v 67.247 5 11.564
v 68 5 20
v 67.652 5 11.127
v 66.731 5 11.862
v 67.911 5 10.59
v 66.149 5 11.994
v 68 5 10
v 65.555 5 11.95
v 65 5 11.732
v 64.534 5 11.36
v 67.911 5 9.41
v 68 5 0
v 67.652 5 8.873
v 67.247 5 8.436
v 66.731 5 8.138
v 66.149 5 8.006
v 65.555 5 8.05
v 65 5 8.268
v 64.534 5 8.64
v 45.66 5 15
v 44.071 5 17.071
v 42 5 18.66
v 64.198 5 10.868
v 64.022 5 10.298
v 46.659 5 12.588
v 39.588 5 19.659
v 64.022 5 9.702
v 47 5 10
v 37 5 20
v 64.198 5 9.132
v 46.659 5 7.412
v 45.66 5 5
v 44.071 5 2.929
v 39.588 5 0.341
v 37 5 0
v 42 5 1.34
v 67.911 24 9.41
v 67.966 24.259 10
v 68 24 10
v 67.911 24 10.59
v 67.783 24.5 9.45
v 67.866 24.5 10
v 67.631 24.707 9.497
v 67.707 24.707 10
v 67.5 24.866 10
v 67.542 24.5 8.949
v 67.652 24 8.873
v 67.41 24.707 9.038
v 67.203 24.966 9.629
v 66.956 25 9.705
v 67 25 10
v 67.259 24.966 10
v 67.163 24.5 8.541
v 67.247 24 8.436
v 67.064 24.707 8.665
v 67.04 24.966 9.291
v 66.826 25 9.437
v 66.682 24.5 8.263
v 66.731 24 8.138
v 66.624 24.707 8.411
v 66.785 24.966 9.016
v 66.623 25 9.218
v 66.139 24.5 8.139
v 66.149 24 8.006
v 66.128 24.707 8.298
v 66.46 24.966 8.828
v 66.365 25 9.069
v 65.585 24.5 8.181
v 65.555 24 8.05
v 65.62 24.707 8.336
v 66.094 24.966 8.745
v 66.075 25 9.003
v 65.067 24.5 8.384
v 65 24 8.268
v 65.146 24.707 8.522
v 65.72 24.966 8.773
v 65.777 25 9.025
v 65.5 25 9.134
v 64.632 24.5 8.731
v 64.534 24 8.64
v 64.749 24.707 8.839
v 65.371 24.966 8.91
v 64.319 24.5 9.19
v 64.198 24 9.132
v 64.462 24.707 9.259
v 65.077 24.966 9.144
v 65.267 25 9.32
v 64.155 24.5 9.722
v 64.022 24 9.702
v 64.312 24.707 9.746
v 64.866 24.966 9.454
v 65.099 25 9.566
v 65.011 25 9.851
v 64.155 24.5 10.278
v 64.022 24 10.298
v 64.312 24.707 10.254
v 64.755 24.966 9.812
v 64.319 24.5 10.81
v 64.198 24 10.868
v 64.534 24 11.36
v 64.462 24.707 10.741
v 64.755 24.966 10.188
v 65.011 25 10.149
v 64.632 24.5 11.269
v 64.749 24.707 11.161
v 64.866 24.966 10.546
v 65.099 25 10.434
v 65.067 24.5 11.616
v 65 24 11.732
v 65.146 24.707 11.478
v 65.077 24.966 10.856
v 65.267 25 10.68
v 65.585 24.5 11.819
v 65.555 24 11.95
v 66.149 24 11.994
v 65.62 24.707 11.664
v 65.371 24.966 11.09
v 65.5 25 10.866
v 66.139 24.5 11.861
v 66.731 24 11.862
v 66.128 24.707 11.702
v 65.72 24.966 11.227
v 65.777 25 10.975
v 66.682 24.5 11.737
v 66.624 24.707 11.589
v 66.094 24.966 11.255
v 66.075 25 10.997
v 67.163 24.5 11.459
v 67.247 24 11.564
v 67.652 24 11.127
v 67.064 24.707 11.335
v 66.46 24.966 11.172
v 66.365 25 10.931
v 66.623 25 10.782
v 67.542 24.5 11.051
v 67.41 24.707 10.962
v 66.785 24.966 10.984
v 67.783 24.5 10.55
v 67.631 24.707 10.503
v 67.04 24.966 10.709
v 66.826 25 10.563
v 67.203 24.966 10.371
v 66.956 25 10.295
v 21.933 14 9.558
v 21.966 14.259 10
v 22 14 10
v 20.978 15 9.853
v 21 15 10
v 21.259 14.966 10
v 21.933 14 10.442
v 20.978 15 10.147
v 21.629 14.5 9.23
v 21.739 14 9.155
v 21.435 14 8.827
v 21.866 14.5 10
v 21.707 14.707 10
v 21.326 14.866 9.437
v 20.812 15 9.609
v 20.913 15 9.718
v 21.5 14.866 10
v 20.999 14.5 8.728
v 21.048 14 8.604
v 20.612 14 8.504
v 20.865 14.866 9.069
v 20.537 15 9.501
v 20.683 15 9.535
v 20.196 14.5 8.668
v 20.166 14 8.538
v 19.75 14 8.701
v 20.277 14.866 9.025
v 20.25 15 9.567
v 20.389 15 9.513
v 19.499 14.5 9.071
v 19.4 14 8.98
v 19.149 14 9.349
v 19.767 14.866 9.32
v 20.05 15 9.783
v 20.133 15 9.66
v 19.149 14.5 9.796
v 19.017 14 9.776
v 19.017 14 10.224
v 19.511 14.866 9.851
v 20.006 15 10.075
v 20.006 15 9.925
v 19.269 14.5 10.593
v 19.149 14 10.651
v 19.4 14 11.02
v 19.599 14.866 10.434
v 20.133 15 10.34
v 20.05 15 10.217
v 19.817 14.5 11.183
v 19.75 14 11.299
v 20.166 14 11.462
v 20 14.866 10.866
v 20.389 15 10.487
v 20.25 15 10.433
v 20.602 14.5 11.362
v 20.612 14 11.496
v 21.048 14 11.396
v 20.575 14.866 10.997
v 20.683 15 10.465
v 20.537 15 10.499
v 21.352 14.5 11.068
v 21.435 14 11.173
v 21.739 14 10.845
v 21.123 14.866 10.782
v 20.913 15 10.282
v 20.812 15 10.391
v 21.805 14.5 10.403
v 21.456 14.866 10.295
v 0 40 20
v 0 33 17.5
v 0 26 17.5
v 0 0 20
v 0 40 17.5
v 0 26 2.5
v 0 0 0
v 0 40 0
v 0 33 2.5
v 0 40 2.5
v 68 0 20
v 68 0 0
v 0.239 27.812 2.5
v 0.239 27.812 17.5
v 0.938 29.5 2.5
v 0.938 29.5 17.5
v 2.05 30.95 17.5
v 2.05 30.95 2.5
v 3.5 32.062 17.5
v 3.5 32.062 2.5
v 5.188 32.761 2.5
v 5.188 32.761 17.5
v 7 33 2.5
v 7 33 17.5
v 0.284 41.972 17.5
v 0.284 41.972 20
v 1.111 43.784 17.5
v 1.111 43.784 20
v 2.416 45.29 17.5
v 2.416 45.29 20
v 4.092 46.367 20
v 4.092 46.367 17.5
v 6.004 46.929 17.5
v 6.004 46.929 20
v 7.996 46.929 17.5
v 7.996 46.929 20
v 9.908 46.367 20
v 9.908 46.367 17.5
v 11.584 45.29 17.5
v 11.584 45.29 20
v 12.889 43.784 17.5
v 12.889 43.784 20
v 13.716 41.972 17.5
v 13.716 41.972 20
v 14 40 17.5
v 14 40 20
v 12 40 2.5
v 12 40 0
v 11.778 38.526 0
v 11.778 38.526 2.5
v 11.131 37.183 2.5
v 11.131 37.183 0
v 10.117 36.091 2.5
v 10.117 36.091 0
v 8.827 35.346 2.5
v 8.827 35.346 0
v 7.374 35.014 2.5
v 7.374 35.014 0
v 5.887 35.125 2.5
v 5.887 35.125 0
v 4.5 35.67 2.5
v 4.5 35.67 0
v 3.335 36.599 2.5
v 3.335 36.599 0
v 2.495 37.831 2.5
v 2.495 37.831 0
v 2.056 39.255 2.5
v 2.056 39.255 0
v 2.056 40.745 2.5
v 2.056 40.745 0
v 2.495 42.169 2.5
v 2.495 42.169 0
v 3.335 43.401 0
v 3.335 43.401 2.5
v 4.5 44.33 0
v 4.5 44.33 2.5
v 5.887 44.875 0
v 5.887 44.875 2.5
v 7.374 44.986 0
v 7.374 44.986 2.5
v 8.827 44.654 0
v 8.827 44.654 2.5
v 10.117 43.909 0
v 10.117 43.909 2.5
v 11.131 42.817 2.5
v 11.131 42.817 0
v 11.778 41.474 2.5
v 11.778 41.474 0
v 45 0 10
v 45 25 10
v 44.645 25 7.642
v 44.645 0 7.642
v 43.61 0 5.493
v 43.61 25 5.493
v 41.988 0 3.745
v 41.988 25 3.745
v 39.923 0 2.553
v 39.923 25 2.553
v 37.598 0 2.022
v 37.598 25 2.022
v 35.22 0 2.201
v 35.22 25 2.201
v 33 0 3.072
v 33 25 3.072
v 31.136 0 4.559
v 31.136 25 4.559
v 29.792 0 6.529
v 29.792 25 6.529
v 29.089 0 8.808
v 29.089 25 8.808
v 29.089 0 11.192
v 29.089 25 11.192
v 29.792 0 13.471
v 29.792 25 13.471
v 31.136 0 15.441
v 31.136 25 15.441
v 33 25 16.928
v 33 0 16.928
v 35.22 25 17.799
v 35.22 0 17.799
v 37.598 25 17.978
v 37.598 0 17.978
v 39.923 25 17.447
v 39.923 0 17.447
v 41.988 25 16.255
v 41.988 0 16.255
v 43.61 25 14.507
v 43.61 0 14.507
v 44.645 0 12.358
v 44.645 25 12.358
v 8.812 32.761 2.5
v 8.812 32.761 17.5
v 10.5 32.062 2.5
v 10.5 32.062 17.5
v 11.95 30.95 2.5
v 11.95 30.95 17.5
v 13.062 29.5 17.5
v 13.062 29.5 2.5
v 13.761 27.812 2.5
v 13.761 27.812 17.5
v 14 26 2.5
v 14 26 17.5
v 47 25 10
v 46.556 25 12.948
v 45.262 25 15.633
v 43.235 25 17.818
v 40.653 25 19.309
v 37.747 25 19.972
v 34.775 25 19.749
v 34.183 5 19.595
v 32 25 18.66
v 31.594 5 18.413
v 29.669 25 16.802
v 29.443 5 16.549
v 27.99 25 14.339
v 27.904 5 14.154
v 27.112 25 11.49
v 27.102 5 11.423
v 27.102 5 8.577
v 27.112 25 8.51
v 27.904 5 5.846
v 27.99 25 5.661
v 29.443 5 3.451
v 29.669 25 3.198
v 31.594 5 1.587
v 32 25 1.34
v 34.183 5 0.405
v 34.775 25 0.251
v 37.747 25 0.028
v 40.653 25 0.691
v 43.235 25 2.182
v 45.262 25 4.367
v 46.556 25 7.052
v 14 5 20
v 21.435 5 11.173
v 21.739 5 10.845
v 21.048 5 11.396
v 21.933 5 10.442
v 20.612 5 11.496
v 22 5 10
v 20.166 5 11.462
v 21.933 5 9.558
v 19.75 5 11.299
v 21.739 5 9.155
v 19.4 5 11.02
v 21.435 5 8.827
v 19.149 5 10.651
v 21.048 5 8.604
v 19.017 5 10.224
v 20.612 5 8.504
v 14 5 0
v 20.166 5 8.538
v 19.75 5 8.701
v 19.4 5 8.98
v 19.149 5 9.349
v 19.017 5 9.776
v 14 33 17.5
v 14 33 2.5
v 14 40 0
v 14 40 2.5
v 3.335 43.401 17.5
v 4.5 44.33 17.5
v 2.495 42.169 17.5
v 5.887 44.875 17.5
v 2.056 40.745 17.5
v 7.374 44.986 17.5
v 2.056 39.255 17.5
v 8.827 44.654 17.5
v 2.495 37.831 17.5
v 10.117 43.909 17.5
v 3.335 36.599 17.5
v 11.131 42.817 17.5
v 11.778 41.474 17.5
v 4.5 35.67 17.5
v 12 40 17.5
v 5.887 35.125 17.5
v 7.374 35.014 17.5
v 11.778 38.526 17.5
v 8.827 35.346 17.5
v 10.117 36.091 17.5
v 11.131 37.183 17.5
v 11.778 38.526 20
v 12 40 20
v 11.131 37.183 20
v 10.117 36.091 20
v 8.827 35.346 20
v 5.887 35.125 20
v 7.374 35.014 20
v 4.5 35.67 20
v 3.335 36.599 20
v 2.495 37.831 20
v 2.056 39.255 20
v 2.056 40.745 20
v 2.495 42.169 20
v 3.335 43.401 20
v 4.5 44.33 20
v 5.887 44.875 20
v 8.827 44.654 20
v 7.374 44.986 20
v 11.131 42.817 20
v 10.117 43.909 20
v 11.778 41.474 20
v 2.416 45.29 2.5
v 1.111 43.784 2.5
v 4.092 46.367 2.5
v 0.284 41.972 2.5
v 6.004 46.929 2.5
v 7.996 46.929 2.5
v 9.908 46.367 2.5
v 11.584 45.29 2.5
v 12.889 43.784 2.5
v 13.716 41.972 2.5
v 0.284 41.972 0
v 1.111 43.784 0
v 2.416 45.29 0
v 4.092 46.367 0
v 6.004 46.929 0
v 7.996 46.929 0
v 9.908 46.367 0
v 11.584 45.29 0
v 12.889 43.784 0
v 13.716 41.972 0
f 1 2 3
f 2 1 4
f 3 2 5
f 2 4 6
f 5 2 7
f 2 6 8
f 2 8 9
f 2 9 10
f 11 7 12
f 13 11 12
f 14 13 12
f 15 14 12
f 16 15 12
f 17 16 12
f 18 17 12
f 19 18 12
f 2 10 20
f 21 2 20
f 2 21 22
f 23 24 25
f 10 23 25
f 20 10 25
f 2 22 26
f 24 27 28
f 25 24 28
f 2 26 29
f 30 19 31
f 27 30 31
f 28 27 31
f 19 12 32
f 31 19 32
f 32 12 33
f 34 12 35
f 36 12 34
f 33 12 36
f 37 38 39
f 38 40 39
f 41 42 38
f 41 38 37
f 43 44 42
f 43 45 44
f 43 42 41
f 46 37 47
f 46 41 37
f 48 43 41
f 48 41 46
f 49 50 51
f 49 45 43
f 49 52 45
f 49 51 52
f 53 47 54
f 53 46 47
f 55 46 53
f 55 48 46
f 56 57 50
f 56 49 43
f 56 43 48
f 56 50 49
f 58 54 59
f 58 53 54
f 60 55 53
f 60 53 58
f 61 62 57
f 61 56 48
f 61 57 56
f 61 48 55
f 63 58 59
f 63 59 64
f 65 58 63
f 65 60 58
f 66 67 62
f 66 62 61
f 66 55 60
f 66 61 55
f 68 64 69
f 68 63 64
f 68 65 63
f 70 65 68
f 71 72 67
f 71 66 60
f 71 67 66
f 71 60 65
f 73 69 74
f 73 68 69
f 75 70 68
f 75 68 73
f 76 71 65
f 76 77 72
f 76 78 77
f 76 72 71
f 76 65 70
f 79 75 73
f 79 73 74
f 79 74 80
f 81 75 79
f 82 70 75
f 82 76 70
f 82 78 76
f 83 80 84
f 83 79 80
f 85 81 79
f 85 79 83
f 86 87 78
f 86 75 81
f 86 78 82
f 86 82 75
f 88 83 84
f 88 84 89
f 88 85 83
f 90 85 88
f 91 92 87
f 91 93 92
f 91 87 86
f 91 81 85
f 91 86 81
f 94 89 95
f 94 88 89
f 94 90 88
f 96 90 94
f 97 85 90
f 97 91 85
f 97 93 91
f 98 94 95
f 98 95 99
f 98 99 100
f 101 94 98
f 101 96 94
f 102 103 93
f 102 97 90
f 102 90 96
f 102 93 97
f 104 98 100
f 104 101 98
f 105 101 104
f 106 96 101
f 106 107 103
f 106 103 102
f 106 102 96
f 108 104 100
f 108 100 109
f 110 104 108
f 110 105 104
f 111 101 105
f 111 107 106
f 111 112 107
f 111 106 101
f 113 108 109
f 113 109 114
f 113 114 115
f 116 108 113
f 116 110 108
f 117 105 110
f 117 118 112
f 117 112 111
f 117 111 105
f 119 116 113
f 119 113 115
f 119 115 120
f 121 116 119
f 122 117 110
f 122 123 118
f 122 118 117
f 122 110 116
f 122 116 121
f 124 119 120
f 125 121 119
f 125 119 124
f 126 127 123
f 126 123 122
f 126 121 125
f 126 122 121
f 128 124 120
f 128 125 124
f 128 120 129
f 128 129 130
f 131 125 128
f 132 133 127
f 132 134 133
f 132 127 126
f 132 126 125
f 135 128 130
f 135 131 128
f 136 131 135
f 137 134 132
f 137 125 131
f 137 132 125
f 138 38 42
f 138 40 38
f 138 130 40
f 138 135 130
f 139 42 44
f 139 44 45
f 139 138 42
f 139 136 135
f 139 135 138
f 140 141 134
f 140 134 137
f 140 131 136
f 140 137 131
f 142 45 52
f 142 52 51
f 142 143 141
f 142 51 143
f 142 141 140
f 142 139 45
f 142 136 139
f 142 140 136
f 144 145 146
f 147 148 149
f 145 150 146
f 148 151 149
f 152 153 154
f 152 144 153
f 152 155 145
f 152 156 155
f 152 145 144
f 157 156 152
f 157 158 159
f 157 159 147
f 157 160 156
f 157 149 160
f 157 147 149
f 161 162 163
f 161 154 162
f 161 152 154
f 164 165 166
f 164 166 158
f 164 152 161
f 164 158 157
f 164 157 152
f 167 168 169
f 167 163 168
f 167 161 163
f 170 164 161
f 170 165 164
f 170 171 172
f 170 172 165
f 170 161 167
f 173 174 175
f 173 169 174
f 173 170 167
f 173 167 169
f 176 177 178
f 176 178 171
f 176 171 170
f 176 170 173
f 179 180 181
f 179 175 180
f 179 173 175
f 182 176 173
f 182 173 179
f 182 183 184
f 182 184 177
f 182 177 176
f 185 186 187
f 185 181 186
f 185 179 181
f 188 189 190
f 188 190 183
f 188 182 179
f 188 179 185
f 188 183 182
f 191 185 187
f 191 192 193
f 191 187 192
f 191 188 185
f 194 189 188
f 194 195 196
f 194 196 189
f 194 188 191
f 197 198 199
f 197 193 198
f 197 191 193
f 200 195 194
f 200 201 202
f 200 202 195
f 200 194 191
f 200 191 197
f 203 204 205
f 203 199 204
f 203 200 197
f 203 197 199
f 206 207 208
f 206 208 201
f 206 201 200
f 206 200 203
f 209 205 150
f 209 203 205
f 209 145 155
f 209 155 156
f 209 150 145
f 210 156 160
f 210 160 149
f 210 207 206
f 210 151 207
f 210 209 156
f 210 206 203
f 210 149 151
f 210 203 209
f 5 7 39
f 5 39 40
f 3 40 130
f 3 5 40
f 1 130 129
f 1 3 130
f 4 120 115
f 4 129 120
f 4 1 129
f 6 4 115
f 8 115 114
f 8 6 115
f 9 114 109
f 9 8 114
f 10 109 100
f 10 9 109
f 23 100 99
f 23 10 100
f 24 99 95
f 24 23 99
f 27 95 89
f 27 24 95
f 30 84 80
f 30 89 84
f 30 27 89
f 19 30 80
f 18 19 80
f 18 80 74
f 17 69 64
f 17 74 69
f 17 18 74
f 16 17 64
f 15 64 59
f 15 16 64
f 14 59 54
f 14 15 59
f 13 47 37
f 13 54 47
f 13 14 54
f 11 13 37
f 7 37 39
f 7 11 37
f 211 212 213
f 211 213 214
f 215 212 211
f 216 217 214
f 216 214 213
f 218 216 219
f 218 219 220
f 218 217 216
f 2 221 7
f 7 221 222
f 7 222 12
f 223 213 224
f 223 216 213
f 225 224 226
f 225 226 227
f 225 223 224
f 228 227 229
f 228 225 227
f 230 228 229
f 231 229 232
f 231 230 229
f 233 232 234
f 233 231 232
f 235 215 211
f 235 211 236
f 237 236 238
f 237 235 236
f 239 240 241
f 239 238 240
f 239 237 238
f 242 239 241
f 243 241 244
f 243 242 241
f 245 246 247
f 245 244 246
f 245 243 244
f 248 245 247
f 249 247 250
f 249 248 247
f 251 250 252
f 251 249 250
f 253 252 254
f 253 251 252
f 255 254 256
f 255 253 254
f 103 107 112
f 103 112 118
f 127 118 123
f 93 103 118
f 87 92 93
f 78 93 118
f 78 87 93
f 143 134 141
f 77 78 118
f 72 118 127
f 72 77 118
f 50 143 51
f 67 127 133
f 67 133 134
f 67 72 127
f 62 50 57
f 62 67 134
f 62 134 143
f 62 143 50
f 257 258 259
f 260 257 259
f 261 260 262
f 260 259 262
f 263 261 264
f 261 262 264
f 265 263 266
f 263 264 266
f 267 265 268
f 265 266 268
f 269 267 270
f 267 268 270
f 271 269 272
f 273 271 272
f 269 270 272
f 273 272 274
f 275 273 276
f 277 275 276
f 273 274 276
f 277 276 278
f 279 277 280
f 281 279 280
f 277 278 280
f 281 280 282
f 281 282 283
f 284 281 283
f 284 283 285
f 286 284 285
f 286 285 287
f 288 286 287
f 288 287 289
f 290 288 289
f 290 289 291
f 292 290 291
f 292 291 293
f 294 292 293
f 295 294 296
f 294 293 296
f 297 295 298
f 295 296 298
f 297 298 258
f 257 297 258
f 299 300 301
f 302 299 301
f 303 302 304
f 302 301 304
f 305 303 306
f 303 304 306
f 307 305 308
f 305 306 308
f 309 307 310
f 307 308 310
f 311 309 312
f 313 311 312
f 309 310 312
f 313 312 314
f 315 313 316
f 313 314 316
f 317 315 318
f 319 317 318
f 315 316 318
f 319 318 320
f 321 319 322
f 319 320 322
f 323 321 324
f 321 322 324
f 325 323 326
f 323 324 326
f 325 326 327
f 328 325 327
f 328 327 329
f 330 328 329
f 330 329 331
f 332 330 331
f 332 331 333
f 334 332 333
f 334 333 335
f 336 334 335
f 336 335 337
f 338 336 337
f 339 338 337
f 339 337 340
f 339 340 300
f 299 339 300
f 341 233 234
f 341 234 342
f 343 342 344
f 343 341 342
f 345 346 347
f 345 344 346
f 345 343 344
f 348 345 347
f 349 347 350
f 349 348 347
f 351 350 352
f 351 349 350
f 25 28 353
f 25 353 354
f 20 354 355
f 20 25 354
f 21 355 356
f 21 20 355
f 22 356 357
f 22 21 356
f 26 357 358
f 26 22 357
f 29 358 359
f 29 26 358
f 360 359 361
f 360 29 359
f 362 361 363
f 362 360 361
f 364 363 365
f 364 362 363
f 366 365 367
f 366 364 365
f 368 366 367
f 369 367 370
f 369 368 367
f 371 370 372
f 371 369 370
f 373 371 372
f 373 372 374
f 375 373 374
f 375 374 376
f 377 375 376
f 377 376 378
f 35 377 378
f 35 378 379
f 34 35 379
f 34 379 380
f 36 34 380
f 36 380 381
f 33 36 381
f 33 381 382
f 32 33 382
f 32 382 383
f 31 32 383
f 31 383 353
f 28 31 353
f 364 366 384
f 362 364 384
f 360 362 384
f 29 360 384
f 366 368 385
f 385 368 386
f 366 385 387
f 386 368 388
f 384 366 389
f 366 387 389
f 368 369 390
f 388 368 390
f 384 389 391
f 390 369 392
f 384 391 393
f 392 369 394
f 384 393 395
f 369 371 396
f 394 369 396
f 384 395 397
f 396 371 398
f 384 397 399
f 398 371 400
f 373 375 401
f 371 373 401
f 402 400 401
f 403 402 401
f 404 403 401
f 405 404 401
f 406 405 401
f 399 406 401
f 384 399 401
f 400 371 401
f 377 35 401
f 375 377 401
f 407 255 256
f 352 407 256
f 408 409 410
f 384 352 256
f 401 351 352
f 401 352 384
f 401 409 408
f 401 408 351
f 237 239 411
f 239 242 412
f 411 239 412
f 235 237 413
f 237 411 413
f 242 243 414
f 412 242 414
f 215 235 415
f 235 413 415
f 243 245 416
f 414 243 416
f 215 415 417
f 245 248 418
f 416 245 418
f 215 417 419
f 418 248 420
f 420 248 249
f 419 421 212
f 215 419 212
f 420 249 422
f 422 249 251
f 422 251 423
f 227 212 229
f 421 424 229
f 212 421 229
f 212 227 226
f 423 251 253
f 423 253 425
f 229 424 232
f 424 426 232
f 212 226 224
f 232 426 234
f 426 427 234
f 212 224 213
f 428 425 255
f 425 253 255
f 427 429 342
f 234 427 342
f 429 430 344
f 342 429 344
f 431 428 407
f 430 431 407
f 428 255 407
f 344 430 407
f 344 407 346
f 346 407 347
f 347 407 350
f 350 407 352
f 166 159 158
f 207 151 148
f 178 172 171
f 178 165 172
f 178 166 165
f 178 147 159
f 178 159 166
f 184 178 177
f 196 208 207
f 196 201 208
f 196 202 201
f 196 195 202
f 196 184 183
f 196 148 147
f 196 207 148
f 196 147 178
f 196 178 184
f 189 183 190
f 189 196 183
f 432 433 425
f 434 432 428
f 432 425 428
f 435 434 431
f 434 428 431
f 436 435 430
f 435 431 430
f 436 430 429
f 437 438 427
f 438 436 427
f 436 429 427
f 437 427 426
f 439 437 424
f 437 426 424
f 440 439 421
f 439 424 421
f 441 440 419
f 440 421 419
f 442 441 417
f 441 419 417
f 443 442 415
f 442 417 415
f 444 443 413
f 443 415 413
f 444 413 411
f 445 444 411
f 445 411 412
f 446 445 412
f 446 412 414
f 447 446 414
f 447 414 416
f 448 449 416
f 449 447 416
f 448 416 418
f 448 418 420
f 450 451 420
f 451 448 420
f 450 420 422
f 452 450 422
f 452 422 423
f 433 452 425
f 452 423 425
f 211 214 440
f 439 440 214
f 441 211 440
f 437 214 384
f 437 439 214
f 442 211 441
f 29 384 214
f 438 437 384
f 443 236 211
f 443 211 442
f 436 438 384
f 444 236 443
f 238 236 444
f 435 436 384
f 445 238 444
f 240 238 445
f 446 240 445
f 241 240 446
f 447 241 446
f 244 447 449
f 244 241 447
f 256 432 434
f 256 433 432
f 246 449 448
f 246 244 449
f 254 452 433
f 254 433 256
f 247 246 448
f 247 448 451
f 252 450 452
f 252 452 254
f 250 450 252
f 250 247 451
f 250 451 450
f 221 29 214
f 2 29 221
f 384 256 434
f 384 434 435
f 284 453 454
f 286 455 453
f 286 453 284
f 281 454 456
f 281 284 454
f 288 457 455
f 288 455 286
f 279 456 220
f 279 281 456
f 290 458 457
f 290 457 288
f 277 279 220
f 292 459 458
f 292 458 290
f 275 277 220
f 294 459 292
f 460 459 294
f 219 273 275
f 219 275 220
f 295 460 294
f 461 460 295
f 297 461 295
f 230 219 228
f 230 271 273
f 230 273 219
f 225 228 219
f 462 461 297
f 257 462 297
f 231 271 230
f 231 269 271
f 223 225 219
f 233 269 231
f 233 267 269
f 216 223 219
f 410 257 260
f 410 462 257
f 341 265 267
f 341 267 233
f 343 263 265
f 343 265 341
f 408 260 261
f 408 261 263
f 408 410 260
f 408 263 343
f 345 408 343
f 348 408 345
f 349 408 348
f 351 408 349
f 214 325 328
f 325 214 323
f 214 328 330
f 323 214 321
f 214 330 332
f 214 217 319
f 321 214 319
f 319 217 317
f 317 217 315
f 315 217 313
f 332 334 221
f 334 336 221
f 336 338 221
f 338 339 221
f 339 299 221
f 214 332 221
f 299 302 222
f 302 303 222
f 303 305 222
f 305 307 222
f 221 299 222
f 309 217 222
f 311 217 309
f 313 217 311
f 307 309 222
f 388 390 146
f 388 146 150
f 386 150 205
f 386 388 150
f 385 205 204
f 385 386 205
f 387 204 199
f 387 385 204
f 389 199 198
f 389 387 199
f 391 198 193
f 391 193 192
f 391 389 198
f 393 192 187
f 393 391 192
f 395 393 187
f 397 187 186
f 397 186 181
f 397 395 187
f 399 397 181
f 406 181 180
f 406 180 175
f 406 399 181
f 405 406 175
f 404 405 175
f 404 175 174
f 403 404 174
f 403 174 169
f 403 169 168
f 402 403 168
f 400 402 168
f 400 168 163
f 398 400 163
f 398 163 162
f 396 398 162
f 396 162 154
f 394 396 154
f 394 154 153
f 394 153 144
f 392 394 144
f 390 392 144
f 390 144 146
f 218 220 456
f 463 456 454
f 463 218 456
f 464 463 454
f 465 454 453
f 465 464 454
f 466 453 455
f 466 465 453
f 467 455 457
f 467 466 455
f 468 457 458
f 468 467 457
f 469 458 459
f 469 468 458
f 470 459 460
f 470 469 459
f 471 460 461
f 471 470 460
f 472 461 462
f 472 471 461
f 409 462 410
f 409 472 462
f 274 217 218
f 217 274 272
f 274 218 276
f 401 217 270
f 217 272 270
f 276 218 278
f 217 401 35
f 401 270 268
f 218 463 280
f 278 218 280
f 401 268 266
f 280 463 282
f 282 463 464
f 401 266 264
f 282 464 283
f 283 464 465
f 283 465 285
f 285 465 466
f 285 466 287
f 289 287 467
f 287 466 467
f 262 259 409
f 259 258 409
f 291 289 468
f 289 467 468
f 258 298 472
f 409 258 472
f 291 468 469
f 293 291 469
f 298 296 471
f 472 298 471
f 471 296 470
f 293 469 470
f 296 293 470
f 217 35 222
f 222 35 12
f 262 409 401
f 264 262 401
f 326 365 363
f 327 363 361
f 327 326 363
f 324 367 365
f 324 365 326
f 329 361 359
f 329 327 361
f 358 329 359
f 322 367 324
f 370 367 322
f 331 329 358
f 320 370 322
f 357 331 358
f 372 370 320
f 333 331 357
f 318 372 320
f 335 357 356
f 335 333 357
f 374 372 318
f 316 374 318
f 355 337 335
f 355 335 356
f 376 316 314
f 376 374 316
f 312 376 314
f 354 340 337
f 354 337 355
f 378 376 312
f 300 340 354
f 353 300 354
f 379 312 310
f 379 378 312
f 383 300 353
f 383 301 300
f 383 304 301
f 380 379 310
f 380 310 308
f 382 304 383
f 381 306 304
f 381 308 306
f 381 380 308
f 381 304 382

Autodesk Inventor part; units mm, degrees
ref_plane "YZ Plane" through (0, 0, 0) normal (1, 0, 0) x (0, 1, 0)
ref_plane "XZ Plane" through (0, 0, 0) normal (0, 1, 0) x (-1, 0, 0)
ref_plane "XY Plane" through (0, 0, 0) normal (0, 0, 1) x (1, 0, 0)
sketch "Sketch1" plane through (0, 0, 0) normal (0, 0, 1) x (1, 0, 0)
  line L0 (0, 0) -> (0, 40)
  line L1 (0, 0) -> (68, 0)
  line L2 (68, 0) -> (68, 5)
  line L3 (68, 5) -> (14, 5)
  arc A0 (14, 40) -> (0, 40) centre (7, 40) ccw
  line L4 (14, 40) -> (14, 5)
  circle A1 centre (7, 40) radius 5
  dimension "d0" = 40
  dimension "d2" = 5
  dimension "d6" = 7
  dimension "d7" = 10
  dimension "d8" = 14
  dimension "d9" = 54
extrude "Extrusion1" add sketch "Sketch1" along normal blind 20
sketch "Sketch2" plane through (14, 5, 0) normal (0, 1, 0) x (1, 0, 0)
  circle A0 centre (6.5, -10) radius 1.5
  line L0 (0, 0) -> (0, -20) projected
  circle A1 centre (23, -10) radius 10
  line L1 (0, 0) -> (54, 0) projected
  circle A2 centre (52, -10) radius 2
  line L2 (54, 0) -> (54, -20) projected
  point P0 (-14, 0)
  dimension "d12" = 3
  dimension "d13" = 6.5
  dimension "d14" = 20
  dimension "d16" = 23
  dimension "d19" = 10
  dimension "d20" = 4
  dimension "d21" = 10
  dimension "d22" = 17
extrude "Extrusion2" add sketch "Sketch2" along normal blind 20
sketch "Sketch4" plane through (0, 0, 20) normal (0, 0, 1) x (1, 0, 0)
  line L0 (22, 25) -> (19, 25) projected
  line L1 (19, 25) -> (22, 25)
  line L2 (22, 5) -> (22, 25) projected
  line L3 (22, 25) -> (22, 15)
  line L4 (22, 15) -> (19, 15)
  line L5 (19, 5) -> (19, 25) projected
  point P0 (0, 0)
  dimension "d25" = 10
extrude "Extrusion3" cut sketch "Sketch4" against normal blind 20
fillet "Fillet1" radius 1 1 edges at (19, 15, 10)
fillet "Fillet2" radius 1 1 edges at (64, 25, 10)
sketch "Sketch5" plane through (37, 25, 10) normal (0, 1, 0) x (1, 0, 0)
  circle A0 centre (0, 0) radius 8
  point P0 (-37, 10)
  dimension "d30" = 16
extrude "Extrusion4" cut sketch "Sketch5" against normal blind 30
sketch "Sketch6" plane through (14, 5, 0) normal (1, 0, 0) x (0, 0, -1)
  point P0 (0, -5)
sketch "Sketch7" plane through (14, 5, 0) normal (1, 0, 0) x (0, 0, -1)
  line L0 (-10, 41.0364) -> (-10, 39.6436)
  line L1 (0, 42) -> (-20, 42) projected
  line L2 (-2.5, 42) -> (-2.5, 28)
  line L3 (-17.5, 42) -> (-17.5, 28)
  line L4 (-17.5, 42) -> (-2.5, 42)
  line L5 (0, 30) -> (-20, 30) projected
  line L6 (-17.5, 28) -> (-2.5, 28)
  point P0 (0, -5)
  dimension "d40" = 14
  dimension "d41" = 14
  dimension "d42" = 15
extrude "Extrusion5" cut sketch "Sketch7" against normal blind 14
fillet "Fillet3" radius 7 2 edges at (14, 33, 10) (0, 33, 10)
equation "\"d19\" = 0.5 * d14"
equation "\"d21\" = d19"
equation "\"d40\" = d41"
properties part number "ValveMk2"
